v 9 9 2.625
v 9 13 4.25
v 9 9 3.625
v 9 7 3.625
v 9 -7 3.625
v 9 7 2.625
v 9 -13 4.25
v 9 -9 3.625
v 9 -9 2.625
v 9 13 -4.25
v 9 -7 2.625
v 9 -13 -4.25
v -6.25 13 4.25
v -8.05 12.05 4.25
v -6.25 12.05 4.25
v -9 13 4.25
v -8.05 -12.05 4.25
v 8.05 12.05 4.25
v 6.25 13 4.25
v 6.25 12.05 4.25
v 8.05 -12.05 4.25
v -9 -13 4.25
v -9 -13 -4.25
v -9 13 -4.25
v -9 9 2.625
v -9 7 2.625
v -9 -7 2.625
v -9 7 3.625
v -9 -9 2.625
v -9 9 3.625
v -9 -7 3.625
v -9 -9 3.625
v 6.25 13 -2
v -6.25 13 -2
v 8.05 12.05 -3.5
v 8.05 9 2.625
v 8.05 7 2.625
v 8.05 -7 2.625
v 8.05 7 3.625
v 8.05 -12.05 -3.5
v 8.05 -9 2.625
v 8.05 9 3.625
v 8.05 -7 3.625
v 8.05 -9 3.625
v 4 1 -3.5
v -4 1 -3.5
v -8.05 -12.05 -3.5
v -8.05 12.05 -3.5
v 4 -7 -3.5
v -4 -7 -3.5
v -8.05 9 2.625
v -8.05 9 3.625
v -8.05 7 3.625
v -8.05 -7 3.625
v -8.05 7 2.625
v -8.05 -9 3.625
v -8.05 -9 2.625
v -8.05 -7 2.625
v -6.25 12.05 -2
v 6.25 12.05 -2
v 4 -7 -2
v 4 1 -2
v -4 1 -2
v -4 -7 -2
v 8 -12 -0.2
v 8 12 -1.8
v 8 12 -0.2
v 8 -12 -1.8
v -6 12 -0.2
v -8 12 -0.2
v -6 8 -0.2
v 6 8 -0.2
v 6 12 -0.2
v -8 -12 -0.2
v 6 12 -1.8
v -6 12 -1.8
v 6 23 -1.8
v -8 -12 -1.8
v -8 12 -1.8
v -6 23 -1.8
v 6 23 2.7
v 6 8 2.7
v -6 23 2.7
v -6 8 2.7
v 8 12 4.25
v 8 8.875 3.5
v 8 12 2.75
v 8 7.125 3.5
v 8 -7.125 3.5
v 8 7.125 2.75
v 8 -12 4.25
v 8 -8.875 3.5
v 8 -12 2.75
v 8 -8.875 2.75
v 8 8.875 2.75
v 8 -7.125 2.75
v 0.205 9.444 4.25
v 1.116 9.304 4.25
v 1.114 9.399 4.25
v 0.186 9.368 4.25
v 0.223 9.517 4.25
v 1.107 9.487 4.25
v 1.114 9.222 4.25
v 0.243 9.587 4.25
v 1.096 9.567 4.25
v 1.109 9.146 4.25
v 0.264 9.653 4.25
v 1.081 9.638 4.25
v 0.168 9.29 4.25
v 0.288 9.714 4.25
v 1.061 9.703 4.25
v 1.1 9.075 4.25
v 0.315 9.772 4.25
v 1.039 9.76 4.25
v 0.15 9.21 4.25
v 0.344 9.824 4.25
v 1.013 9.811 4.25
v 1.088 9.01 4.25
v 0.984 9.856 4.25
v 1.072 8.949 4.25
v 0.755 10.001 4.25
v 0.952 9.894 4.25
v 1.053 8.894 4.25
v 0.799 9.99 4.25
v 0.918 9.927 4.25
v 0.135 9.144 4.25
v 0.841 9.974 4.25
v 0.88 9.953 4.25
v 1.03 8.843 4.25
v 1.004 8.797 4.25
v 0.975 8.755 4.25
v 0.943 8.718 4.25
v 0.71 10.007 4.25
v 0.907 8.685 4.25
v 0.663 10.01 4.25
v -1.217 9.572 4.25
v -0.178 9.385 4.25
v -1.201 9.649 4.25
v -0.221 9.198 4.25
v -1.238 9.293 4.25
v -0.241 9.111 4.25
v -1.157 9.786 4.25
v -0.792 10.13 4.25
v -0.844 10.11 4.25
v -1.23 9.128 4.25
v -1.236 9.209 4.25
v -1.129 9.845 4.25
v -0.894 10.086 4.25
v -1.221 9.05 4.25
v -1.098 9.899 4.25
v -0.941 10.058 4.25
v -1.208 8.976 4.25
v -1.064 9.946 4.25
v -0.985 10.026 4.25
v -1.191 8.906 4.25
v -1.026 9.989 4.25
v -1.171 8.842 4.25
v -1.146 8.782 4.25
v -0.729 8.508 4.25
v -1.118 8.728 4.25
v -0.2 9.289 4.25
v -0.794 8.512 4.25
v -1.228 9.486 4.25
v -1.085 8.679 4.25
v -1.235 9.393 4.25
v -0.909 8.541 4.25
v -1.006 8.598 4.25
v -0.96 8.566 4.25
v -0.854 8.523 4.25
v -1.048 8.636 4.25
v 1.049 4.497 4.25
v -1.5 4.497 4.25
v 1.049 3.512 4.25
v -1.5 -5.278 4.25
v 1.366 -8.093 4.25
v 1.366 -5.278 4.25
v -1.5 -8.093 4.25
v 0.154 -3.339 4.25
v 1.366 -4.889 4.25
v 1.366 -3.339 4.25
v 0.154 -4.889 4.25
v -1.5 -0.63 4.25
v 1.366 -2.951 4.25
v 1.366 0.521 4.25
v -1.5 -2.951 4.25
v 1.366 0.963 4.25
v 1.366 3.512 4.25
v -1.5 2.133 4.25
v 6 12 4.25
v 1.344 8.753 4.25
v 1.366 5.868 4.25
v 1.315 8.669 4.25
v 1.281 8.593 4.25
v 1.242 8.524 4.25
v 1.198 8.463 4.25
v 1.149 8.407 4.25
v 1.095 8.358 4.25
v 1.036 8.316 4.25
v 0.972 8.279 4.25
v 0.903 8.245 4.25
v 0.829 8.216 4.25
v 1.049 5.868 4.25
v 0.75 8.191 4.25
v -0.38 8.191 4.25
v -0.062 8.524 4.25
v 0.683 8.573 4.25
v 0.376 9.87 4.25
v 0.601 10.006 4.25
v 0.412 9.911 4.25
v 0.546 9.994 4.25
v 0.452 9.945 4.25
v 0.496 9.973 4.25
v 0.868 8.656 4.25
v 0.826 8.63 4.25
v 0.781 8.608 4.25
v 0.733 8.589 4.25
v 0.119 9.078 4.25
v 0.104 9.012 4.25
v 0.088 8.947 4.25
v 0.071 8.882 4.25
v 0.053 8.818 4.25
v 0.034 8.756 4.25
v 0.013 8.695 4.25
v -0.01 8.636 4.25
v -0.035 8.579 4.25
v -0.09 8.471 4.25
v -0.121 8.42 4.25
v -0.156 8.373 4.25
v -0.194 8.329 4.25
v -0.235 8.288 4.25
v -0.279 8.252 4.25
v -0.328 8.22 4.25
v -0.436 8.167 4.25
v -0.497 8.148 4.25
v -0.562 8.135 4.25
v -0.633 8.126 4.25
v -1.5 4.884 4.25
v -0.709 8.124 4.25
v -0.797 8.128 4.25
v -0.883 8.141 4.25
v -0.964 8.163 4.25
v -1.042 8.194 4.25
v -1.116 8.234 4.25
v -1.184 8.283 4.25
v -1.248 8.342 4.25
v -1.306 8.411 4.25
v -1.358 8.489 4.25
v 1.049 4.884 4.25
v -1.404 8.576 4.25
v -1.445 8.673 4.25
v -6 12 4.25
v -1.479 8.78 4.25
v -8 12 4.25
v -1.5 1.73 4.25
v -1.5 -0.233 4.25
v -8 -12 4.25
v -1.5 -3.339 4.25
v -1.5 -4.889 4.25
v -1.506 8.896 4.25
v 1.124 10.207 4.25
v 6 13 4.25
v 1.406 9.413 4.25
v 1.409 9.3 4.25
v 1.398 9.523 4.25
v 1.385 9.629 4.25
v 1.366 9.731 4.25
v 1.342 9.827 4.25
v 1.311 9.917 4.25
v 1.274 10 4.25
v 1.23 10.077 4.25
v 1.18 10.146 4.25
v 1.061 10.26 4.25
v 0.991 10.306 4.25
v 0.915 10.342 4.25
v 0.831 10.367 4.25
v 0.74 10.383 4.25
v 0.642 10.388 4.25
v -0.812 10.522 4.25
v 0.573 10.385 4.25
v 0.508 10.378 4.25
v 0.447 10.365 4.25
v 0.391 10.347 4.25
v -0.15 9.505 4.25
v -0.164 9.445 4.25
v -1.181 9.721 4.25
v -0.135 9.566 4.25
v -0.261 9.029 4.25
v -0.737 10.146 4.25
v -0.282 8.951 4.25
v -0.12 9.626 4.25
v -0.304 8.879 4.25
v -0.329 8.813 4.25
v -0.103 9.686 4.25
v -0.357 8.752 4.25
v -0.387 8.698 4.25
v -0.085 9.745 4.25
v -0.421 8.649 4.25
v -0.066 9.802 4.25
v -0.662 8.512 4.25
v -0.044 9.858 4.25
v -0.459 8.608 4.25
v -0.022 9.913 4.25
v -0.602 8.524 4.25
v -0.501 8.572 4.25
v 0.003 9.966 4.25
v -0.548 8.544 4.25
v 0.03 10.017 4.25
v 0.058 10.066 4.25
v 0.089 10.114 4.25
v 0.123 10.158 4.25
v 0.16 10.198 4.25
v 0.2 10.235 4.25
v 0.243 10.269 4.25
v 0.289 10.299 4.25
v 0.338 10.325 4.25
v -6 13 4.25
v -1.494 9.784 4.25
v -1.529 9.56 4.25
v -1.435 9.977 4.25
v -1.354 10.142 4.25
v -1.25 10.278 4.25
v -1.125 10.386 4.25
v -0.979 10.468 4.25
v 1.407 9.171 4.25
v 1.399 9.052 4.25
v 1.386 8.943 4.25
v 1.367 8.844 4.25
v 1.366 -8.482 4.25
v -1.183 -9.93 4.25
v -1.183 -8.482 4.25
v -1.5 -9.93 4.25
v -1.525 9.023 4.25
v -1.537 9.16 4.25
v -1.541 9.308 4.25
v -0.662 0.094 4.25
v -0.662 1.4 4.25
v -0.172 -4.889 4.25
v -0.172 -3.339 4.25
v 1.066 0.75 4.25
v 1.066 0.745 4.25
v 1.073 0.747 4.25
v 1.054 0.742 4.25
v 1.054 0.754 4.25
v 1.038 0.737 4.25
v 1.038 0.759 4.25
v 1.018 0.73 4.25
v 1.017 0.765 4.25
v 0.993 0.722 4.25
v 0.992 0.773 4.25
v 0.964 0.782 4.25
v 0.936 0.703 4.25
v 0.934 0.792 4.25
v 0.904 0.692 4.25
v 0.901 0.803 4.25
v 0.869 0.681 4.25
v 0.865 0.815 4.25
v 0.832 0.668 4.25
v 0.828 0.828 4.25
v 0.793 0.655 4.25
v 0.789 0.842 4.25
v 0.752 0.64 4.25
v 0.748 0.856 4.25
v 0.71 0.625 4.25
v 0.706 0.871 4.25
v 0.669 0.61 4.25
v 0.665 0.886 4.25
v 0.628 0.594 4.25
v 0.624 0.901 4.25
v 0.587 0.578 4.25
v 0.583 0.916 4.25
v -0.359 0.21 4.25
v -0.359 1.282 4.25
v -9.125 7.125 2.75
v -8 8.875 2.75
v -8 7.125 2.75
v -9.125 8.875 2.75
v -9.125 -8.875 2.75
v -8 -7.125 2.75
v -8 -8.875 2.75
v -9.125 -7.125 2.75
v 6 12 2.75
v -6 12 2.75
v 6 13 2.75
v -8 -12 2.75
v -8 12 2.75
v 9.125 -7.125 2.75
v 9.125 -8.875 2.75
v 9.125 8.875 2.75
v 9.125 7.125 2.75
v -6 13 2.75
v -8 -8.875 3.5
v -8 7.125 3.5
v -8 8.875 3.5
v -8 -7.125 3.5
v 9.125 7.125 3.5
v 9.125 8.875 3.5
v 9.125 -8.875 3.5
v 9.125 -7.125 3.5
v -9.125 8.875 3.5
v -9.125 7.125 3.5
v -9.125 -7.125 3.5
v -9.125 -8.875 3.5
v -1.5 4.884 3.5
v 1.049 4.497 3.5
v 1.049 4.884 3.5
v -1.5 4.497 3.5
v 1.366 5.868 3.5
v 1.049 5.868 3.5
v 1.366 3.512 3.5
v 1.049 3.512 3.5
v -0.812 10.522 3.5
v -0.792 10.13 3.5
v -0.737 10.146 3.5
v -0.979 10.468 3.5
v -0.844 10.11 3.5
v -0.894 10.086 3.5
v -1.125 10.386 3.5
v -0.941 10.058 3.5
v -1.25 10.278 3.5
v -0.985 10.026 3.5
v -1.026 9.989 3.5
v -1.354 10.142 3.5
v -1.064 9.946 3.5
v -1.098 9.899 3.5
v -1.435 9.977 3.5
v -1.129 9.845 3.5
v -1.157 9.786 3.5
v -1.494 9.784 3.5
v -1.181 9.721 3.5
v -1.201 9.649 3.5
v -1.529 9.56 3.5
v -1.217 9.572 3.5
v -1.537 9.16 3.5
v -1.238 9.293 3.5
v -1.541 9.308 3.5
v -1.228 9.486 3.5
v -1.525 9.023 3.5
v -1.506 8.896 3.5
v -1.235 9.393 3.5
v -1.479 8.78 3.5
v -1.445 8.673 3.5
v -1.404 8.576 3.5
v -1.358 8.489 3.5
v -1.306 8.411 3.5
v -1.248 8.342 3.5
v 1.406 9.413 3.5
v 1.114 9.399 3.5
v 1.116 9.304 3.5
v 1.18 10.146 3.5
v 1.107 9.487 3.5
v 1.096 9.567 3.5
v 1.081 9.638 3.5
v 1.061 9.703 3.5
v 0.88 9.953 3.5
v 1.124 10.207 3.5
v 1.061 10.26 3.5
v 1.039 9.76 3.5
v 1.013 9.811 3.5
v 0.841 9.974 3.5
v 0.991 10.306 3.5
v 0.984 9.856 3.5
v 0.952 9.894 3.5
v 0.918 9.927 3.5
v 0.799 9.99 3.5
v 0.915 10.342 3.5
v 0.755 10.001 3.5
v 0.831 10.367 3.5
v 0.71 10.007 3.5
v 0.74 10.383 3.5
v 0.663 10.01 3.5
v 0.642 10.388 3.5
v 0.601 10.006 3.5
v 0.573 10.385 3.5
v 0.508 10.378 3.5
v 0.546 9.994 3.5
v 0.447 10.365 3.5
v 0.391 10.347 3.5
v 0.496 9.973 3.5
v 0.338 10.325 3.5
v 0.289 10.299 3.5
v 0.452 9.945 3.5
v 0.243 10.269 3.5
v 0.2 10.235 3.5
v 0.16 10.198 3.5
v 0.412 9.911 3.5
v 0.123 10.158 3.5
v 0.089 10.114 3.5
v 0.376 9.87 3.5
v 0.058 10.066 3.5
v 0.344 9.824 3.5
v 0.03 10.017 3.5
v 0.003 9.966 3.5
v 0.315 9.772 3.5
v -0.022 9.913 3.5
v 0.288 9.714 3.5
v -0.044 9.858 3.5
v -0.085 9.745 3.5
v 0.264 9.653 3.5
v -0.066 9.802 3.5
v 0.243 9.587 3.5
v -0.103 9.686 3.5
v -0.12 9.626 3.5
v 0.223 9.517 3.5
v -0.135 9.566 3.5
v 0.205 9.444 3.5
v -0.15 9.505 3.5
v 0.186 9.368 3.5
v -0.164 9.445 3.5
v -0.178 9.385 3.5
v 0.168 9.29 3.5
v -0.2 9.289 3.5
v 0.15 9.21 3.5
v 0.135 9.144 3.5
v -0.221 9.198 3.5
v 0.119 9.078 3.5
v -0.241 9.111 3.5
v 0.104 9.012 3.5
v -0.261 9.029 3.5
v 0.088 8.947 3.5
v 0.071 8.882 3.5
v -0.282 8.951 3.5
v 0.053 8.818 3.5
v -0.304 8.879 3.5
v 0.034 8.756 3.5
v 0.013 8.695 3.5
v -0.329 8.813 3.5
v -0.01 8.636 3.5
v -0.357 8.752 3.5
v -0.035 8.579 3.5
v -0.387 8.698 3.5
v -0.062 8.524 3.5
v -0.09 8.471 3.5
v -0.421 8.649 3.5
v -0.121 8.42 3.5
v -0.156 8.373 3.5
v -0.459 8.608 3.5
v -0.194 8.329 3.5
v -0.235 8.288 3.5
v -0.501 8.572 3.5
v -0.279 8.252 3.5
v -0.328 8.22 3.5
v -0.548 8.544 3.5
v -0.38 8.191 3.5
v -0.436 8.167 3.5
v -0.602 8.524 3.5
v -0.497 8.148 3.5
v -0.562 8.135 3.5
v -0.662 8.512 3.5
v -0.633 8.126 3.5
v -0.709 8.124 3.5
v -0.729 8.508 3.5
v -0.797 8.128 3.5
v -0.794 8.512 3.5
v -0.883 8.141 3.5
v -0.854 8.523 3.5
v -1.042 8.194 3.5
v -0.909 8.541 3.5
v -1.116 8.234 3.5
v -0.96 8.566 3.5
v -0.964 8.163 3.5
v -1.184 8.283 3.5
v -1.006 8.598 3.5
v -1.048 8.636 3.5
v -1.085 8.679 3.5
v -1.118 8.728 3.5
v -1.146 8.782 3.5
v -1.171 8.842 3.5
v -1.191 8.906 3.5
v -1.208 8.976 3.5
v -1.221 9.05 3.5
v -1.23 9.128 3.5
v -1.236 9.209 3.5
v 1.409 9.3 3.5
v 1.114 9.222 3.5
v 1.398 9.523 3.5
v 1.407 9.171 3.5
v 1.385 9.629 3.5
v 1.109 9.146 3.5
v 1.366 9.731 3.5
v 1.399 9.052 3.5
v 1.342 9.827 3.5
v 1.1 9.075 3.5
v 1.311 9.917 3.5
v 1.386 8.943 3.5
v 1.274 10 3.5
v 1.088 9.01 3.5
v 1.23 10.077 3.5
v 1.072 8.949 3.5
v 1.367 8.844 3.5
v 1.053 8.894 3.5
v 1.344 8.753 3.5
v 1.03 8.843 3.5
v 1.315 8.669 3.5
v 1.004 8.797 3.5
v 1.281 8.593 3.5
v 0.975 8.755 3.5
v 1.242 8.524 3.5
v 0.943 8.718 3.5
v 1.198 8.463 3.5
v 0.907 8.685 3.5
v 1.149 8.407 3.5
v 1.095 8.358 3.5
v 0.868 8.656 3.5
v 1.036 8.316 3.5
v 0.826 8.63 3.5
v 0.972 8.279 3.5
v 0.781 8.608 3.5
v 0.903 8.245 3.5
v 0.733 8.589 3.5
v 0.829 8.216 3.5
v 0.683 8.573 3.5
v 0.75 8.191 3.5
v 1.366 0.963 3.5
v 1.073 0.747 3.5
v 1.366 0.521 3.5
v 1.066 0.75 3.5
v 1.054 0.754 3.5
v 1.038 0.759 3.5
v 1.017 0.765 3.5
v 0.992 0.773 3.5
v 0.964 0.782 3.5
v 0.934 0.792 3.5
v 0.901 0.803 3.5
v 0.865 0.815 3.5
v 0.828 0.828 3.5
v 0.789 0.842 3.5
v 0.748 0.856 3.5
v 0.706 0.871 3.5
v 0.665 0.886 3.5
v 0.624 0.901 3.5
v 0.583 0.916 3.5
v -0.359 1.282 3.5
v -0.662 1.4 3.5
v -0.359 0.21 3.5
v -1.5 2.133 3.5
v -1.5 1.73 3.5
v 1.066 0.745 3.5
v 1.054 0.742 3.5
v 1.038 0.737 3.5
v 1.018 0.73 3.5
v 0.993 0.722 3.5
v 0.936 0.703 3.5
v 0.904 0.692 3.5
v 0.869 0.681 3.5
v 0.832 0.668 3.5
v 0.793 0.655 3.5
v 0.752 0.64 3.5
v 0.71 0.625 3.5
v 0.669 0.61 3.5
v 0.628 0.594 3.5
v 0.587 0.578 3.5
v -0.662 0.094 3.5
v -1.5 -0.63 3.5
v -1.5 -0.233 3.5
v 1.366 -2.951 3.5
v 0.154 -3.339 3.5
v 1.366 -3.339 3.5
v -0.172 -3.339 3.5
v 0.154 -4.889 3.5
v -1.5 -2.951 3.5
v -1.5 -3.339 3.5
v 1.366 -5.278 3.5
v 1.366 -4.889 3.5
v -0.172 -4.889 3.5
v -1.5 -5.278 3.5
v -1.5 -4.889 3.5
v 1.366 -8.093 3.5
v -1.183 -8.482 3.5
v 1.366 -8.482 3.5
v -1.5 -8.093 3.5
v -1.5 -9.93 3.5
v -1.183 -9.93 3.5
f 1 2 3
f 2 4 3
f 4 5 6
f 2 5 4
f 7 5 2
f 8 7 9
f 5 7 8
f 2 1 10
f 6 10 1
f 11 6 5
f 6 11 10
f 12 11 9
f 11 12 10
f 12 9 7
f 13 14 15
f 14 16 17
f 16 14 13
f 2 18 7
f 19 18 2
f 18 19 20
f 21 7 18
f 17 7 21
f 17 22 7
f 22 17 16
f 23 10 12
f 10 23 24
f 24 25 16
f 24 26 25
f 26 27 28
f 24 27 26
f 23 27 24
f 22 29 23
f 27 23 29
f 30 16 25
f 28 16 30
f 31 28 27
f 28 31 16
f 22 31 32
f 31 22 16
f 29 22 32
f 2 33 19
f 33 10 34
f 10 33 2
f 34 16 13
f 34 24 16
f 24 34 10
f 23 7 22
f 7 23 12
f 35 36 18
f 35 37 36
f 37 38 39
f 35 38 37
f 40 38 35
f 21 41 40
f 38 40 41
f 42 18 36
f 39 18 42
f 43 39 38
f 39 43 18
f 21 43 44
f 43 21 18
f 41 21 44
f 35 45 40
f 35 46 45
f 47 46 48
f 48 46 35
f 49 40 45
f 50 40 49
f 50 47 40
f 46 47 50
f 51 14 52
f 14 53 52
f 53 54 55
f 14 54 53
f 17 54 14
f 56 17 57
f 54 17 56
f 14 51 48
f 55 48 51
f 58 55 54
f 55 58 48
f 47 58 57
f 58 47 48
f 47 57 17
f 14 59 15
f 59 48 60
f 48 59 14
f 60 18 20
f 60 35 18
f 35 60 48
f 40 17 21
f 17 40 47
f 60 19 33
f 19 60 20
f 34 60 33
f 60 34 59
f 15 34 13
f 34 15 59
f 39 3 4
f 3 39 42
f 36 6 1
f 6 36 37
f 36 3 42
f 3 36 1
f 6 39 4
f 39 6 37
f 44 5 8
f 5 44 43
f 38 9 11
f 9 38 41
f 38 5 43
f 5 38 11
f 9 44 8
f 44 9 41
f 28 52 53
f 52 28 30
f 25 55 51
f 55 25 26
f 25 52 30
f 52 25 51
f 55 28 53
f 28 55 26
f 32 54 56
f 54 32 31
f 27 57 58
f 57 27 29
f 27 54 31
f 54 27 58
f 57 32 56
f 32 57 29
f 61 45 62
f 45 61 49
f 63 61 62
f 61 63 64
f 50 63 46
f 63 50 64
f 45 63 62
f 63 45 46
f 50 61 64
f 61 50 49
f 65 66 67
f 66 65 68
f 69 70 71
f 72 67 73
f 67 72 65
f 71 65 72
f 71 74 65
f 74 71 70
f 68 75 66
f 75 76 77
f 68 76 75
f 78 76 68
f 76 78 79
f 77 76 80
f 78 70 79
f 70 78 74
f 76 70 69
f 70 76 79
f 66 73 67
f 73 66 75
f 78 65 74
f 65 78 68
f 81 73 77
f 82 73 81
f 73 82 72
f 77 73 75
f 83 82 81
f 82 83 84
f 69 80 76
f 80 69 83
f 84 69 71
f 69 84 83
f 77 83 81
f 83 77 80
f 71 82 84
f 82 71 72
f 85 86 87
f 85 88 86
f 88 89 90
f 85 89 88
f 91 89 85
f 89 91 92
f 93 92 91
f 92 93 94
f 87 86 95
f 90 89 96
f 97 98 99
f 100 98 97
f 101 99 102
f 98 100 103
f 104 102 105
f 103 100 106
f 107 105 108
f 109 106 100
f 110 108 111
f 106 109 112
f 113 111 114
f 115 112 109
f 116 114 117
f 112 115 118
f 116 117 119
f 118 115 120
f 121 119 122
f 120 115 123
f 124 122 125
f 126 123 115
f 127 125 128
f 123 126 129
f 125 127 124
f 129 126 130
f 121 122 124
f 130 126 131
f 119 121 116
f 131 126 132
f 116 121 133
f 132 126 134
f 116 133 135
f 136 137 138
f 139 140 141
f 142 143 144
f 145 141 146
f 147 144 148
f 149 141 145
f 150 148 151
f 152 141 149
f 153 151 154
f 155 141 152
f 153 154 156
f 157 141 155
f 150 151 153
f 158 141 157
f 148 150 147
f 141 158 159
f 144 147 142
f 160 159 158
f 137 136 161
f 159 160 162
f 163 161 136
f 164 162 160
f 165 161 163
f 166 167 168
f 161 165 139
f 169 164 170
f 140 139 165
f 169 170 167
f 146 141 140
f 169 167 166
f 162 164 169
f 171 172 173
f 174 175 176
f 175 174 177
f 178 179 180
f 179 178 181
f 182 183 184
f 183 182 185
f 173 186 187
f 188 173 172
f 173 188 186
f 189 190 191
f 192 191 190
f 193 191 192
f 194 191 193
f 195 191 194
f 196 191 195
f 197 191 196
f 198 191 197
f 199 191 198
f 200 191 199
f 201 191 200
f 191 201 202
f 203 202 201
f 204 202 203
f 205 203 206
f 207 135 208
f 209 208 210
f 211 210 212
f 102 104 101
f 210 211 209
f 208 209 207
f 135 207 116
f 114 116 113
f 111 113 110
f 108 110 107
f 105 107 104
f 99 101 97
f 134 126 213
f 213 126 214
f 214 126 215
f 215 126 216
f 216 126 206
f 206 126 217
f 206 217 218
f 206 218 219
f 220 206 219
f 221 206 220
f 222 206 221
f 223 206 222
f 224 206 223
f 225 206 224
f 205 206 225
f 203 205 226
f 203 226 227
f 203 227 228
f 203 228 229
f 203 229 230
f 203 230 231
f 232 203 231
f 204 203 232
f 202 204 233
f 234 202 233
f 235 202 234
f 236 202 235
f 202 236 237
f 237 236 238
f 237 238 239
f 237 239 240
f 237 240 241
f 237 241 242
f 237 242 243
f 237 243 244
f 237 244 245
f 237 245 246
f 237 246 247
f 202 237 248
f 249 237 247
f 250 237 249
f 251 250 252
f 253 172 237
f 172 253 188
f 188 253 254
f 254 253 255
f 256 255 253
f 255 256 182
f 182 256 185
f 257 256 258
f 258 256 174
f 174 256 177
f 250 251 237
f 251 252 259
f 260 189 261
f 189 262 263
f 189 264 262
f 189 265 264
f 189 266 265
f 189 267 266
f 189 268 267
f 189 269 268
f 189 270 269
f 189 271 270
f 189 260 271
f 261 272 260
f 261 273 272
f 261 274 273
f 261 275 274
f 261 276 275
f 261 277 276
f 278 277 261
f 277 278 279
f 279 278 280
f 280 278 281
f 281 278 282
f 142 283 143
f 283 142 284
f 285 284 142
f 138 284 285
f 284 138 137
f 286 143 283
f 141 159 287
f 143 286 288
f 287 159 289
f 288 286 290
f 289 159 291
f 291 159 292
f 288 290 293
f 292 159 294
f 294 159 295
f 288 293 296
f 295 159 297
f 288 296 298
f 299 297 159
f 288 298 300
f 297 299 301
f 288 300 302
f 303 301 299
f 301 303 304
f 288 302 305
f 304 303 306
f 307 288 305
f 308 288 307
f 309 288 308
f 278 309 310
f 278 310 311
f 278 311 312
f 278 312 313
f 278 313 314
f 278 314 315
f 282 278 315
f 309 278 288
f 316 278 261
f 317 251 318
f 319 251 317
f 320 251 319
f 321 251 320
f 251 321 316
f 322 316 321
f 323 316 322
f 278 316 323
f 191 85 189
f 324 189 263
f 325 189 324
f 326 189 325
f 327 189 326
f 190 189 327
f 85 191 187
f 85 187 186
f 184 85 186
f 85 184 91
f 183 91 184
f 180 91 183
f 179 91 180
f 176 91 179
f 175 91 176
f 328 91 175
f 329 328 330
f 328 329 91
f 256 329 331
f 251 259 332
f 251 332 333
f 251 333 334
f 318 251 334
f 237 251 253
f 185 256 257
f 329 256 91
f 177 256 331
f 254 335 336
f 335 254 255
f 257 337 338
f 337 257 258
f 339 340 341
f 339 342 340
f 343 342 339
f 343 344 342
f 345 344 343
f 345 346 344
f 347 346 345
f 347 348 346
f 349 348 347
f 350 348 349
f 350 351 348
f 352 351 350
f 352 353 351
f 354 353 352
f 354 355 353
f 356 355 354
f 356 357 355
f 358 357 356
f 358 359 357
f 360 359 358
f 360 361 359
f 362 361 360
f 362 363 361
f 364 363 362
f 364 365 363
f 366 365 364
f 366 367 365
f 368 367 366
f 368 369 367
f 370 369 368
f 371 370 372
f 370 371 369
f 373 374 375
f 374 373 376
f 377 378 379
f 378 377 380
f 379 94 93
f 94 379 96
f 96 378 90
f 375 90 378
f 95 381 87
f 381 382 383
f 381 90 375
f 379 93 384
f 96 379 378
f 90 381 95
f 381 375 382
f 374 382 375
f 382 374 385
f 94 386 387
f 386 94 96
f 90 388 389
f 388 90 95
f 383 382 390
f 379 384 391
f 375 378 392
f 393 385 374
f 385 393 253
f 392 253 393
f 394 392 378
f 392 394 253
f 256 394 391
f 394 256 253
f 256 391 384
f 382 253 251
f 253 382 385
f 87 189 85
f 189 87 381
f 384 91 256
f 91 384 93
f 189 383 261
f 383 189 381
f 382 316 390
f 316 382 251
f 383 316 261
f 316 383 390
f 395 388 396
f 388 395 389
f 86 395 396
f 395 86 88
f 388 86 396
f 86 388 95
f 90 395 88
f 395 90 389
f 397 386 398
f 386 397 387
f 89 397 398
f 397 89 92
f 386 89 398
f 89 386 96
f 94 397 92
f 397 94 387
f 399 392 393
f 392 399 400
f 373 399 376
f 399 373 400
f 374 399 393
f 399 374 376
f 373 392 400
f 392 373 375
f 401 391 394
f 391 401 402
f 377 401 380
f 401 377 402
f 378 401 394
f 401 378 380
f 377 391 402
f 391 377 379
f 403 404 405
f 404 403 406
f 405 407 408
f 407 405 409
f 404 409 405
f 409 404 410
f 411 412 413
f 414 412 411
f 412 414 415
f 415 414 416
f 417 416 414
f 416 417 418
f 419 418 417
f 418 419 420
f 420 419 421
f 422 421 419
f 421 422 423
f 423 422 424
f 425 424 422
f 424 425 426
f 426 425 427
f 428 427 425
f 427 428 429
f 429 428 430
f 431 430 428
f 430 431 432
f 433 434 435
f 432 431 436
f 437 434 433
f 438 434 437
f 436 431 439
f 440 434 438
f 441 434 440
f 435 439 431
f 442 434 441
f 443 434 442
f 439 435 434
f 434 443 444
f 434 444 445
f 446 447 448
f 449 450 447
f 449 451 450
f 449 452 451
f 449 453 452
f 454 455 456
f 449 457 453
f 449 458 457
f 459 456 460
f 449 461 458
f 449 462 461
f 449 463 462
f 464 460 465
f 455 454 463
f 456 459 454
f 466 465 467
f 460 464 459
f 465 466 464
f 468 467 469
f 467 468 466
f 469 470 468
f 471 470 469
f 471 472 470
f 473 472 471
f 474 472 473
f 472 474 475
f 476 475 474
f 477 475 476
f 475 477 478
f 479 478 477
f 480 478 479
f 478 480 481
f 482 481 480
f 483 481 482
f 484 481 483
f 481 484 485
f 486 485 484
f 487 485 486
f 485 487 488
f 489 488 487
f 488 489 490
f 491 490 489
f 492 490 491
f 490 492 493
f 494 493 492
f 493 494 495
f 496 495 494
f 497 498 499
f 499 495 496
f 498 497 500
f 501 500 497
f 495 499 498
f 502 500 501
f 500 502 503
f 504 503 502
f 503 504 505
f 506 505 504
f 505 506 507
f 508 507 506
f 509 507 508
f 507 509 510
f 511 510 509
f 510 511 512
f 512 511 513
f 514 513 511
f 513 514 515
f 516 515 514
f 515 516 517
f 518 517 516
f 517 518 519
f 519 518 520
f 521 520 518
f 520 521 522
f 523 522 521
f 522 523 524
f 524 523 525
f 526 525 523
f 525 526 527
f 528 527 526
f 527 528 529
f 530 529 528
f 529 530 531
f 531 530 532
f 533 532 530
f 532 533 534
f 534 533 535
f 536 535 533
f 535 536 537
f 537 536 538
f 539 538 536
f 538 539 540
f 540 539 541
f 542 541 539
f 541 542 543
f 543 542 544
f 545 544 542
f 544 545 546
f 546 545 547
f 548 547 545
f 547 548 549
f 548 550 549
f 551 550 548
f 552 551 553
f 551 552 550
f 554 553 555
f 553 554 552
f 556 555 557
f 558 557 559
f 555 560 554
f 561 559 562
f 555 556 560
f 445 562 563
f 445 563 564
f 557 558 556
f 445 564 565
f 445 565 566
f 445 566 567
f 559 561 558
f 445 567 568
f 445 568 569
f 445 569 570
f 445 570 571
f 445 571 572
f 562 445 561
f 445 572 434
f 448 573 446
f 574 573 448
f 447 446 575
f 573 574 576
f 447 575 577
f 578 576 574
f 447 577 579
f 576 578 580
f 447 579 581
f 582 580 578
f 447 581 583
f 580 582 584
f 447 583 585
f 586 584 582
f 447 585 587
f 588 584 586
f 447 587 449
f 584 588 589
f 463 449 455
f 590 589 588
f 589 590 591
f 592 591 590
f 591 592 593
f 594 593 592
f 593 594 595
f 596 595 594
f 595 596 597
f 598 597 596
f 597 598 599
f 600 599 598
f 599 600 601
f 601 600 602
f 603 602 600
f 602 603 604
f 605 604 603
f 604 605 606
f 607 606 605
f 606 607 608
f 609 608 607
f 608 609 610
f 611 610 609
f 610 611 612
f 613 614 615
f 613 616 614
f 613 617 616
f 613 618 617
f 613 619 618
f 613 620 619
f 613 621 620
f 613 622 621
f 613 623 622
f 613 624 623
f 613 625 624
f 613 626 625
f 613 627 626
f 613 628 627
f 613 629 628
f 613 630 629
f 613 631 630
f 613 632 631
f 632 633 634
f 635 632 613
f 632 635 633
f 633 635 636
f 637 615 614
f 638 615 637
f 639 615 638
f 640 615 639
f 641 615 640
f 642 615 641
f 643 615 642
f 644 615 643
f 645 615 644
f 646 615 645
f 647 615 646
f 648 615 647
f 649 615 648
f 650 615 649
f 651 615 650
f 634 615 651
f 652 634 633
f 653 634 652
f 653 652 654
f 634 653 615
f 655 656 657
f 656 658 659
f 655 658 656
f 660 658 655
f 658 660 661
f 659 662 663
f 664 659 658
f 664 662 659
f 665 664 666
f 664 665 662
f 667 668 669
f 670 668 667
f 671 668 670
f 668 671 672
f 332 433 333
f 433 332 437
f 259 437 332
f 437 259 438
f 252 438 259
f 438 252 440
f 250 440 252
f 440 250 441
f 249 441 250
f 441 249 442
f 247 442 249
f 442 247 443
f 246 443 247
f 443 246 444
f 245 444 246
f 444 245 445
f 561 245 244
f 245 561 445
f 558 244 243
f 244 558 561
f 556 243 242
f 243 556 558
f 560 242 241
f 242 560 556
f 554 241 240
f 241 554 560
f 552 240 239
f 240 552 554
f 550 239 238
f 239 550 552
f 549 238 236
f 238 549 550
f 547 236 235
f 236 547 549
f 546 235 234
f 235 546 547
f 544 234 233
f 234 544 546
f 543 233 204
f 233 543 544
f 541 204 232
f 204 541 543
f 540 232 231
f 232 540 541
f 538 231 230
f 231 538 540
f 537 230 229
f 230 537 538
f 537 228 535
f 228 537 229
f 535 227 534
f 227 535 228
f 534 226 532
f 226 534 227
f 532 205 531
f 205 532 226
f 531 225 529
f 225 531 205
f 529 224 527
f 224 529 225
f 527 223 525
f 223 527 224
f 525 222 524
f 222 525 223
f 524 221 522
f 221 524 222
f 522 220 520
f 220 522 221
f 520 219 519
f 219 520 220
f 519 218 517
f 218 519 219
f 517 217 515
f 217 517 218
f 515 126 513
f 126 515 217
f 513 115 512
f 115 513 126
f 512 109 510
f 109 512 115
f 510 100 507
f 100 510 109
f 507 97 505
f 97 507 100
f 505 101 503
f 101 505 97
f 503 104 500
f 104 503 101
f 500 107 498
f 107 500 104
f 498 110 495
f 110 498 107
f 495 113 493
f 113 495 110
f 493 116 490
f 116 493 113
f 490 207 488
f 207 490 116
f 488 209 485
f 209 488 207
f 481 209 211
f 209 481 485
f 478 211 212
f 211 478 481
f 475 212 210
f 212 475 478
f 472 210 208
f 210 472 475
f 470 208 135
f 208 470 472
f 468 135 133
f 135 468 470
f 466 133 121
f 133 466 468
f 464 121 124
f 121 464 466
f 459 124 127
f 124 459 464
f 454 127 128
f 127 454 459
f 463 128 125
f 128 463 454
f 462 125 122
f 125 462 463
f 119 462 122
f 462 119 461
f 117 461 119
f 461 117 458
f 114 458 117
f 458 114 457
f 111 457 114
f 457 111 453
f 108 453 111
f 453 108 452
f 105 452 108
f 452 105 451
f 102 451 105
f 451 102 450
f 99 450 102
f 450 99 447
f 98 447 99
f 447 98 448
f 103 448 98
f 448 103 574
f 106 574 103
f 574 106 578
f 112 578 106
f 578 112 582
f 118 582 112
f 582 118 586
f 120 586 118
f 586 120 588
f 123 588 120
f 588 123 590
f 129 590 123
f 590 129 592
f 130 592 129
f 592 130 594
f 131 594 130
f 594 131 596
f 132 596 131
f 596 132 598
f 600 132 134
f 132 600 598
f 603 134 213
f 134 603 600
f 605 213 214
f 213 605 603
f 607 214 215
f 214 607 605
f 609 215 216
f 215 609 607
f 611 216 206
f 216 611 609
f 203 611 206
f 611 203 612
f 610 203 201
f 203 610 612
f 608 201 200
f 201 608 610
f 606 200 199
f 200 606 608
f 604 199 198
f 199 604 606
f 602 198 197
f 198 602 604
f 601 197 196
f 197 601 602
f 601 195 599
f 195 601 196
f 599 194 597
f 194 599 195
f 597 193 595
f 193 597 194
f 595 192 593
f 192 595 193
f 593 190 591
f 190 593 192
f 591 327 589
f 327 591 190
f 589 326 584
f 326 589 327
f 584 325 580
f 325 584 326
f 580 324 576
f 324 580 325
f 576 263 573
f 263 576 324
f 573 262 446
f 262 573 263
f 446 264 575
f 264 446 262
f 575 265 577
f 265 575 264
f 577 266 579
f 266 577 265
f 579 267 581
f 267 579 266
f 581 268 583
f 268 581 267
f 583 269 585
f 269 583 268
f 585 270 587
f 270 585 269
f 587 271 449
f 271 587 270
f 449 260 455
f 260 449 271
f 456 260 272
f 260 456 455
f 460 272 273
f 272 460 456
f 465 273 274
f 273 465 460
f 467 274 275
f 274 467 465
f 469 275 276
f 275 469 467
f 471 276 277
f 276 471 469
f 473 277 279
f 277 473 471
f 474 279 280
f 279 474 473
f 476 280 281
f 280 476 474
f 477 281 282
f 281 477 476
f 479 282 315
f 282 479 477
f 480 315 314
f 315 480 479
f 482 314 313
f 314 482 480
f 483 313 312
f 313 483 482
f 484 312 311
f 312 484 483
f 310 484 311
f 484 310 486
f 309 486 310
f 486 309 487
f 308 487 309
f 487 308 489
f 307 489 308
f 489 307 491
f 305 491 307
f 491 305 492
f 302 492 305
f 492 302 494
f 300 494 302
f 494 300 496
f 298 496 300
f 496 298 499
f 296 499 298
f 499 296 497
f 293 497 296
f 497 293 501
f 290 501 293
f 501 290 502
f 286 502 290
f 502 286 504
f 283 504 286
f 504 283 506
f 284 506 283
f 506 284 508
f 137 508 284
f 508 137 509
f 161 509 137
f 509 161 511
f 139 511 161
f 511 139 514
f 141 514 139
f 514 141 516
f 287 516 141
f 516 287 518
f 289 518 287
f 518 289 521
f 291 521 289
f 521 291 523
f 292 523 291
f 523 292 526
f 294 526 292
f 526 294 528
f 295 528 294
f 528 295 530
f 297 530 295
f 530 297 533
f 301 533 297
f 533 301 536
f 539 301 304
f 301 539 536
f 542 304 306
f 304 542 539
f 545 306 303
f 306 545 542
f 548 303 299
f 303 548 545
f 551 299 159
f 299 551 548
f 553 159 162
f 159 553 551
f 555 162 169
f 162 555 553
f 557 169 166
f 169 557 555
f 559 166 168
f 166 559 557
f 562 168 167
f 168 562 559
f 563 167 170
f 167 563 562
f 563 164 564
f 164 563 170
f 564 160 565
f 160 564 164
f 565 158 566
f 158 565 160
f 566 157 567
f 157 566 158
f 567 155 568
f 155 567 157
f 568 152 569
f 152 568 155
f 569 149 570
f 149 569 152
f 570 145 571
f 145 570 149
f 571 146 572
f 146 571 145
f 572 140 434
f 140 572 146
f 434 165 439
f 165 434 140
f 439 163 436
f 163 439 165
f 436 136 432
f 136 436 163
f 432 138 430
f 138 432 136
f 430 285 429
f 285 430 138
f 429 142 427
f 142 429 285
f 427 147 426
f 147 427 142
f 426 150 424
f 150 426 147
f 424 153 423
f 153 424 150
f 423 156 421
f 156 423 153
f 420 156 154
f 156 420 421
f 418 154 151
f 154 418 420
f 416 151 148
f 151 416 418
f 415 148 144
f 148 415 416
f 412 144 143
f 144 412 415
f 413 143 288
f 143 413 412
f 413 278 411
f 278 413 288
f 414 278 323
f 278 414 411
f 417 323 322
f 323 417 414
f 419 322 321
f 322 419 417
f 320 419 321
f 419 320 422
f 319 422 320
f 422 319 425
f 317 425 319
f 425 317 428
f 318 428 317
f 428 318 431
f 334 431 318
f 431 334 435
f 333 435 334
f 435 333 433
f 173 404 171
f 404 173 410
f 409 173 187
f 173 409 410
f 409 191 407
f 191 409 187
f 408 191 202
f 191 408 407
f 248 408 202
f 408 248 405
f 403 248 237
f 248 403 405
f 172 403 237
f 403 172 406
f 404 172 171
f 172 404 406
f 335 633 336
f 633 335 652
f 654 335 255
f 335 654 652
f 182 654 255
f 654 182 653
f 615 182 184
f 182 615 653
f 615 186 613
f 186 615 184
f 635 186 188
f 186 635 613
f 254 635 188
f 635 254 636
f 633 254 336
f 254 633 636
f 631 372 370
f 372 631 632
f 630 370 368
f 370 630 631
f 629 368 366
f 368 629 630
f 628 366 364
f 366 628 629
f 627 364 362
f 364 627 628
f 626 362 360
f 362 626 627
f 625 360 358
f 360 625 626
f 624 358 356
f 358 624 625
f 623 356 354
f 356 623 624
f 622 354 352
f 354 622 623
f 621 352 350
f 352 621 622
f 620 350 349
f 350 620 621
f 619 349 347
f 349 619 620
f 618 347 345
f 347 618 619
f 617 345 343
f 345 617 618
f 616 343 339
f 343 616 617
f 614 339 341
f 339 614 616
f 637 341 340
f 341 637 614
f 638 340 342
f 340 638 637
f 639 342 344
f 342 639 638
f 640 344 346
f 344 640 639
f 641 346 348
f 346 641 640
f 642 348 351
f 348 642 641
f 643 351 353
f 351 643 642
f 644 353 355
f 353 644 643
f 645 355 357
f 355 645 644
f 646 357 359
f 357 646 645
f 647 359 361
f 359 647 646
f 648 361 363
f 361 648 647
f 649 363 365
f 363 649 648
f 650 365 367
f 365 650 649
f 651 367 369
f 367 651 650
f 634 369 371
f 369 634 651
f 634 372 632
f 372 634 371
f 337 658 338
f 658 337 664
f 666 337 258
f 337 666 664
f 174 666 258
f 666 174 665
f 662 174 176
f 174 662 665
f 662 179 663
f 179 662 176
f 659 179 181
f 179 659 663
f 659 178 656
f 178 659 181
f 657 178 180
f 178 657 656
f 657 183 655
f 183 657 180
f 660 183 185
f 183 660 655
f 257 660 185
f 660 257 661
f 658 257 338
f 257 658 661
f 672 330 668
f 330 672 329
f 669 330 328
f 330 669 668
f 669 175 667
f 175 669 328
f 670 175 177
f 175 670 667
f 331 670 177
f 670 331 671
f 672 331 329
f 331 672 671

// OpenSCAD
// STAHL CASE
// Copyright (c) 2021 Lone Dynamics Corporation

$fn = 30;

box_width = 18;
box_length = 26;
box_height = 8.5;
box_thickness = 2.0;

lid_thickness = 1.5;

cutout_width = 16.10;
cutout_length = 24.10;
cutout_height = 7;

cutout_usb_width = 12.5;

board_height = 1.4;

ldp_case();
ldp_board(-1);

//color([0.8,0.8,0.8]) ldp_lid(6);
color([0.8,0.8,0.8]) ldp_lid(2);

module ldp_board(o)
{
	translate([0,0,o])
		color([0.0,0.8,0.0]) cube([16, 24, 1.6], center=true);
	translate([0,19.5-4,o+1.45])
		color([0.9,0.9,0.9]) cube([12, 15, 4.5], center=true);
	
}

module ldp_case()
{

	difference() {
		
		cube([box_width,box_length,box_height], center=true);
		
		translate([0,0,0.5])
			cube([cutout_width,cutout_length,cutout_height+1], center=true);

		translate([0,15,3])
			cube([cutout_usb_width,10,10], center=true);

		translate([box_width/2,box_length/2-5,box_height/2-1.125])
			cube([2,2,1], center=true);
		translate([box_width/2,-box_length/2+5,box_height/2-1.125])
			cube([2,2,1], center=true);
		translate([-box_width/2,box_length/2-5,box_height/2-1.125])
			cube([2,2,1], center=true);
		translate([-box_width/2,-box_length/2+5,box_height/2-1.125])
			cube([2,2,1], center=true);

	}

	// board support
	translate([0,-3,-2.75])
		cube([8,8,1.5], center=true);


}

module ldp_lid(o)
{
	
	difference() {
		
		union() {
			
			translate([0,0,o+1.5])
				cube([box_width-2,box_length-2,lid_thickness], center=true);

			translate([0,box_length/2-1,o+1.5])
				cube([12,2,lid_thickness], center=true);

			translate([box_width/2-0.5,box_length/2-5,o+1.125])
				cube([1.25,1.75,0.75], center=true);
			translate([box_width/2-0.5,-box_length/2+5,o+1.125])
				cube([1.25,1.75,0.75], center=true);
			translate([-box_width/2+0.5,box_length/2-5,o+1.125])
				cube([1.25,1.75,0.75], center=true);
			translate([-box_width/2+0.5,-box_length/2+5,o+1.125])
				cube([1.25,1.75,0.75], center=true);
		}
	
		rotate(270)
			translate([0.5,-1.5,o+1.5])
				linear_extrude(1)
					text("STAHL", size=3, spacing=1.75, halign="center");
	
	}
	
}
